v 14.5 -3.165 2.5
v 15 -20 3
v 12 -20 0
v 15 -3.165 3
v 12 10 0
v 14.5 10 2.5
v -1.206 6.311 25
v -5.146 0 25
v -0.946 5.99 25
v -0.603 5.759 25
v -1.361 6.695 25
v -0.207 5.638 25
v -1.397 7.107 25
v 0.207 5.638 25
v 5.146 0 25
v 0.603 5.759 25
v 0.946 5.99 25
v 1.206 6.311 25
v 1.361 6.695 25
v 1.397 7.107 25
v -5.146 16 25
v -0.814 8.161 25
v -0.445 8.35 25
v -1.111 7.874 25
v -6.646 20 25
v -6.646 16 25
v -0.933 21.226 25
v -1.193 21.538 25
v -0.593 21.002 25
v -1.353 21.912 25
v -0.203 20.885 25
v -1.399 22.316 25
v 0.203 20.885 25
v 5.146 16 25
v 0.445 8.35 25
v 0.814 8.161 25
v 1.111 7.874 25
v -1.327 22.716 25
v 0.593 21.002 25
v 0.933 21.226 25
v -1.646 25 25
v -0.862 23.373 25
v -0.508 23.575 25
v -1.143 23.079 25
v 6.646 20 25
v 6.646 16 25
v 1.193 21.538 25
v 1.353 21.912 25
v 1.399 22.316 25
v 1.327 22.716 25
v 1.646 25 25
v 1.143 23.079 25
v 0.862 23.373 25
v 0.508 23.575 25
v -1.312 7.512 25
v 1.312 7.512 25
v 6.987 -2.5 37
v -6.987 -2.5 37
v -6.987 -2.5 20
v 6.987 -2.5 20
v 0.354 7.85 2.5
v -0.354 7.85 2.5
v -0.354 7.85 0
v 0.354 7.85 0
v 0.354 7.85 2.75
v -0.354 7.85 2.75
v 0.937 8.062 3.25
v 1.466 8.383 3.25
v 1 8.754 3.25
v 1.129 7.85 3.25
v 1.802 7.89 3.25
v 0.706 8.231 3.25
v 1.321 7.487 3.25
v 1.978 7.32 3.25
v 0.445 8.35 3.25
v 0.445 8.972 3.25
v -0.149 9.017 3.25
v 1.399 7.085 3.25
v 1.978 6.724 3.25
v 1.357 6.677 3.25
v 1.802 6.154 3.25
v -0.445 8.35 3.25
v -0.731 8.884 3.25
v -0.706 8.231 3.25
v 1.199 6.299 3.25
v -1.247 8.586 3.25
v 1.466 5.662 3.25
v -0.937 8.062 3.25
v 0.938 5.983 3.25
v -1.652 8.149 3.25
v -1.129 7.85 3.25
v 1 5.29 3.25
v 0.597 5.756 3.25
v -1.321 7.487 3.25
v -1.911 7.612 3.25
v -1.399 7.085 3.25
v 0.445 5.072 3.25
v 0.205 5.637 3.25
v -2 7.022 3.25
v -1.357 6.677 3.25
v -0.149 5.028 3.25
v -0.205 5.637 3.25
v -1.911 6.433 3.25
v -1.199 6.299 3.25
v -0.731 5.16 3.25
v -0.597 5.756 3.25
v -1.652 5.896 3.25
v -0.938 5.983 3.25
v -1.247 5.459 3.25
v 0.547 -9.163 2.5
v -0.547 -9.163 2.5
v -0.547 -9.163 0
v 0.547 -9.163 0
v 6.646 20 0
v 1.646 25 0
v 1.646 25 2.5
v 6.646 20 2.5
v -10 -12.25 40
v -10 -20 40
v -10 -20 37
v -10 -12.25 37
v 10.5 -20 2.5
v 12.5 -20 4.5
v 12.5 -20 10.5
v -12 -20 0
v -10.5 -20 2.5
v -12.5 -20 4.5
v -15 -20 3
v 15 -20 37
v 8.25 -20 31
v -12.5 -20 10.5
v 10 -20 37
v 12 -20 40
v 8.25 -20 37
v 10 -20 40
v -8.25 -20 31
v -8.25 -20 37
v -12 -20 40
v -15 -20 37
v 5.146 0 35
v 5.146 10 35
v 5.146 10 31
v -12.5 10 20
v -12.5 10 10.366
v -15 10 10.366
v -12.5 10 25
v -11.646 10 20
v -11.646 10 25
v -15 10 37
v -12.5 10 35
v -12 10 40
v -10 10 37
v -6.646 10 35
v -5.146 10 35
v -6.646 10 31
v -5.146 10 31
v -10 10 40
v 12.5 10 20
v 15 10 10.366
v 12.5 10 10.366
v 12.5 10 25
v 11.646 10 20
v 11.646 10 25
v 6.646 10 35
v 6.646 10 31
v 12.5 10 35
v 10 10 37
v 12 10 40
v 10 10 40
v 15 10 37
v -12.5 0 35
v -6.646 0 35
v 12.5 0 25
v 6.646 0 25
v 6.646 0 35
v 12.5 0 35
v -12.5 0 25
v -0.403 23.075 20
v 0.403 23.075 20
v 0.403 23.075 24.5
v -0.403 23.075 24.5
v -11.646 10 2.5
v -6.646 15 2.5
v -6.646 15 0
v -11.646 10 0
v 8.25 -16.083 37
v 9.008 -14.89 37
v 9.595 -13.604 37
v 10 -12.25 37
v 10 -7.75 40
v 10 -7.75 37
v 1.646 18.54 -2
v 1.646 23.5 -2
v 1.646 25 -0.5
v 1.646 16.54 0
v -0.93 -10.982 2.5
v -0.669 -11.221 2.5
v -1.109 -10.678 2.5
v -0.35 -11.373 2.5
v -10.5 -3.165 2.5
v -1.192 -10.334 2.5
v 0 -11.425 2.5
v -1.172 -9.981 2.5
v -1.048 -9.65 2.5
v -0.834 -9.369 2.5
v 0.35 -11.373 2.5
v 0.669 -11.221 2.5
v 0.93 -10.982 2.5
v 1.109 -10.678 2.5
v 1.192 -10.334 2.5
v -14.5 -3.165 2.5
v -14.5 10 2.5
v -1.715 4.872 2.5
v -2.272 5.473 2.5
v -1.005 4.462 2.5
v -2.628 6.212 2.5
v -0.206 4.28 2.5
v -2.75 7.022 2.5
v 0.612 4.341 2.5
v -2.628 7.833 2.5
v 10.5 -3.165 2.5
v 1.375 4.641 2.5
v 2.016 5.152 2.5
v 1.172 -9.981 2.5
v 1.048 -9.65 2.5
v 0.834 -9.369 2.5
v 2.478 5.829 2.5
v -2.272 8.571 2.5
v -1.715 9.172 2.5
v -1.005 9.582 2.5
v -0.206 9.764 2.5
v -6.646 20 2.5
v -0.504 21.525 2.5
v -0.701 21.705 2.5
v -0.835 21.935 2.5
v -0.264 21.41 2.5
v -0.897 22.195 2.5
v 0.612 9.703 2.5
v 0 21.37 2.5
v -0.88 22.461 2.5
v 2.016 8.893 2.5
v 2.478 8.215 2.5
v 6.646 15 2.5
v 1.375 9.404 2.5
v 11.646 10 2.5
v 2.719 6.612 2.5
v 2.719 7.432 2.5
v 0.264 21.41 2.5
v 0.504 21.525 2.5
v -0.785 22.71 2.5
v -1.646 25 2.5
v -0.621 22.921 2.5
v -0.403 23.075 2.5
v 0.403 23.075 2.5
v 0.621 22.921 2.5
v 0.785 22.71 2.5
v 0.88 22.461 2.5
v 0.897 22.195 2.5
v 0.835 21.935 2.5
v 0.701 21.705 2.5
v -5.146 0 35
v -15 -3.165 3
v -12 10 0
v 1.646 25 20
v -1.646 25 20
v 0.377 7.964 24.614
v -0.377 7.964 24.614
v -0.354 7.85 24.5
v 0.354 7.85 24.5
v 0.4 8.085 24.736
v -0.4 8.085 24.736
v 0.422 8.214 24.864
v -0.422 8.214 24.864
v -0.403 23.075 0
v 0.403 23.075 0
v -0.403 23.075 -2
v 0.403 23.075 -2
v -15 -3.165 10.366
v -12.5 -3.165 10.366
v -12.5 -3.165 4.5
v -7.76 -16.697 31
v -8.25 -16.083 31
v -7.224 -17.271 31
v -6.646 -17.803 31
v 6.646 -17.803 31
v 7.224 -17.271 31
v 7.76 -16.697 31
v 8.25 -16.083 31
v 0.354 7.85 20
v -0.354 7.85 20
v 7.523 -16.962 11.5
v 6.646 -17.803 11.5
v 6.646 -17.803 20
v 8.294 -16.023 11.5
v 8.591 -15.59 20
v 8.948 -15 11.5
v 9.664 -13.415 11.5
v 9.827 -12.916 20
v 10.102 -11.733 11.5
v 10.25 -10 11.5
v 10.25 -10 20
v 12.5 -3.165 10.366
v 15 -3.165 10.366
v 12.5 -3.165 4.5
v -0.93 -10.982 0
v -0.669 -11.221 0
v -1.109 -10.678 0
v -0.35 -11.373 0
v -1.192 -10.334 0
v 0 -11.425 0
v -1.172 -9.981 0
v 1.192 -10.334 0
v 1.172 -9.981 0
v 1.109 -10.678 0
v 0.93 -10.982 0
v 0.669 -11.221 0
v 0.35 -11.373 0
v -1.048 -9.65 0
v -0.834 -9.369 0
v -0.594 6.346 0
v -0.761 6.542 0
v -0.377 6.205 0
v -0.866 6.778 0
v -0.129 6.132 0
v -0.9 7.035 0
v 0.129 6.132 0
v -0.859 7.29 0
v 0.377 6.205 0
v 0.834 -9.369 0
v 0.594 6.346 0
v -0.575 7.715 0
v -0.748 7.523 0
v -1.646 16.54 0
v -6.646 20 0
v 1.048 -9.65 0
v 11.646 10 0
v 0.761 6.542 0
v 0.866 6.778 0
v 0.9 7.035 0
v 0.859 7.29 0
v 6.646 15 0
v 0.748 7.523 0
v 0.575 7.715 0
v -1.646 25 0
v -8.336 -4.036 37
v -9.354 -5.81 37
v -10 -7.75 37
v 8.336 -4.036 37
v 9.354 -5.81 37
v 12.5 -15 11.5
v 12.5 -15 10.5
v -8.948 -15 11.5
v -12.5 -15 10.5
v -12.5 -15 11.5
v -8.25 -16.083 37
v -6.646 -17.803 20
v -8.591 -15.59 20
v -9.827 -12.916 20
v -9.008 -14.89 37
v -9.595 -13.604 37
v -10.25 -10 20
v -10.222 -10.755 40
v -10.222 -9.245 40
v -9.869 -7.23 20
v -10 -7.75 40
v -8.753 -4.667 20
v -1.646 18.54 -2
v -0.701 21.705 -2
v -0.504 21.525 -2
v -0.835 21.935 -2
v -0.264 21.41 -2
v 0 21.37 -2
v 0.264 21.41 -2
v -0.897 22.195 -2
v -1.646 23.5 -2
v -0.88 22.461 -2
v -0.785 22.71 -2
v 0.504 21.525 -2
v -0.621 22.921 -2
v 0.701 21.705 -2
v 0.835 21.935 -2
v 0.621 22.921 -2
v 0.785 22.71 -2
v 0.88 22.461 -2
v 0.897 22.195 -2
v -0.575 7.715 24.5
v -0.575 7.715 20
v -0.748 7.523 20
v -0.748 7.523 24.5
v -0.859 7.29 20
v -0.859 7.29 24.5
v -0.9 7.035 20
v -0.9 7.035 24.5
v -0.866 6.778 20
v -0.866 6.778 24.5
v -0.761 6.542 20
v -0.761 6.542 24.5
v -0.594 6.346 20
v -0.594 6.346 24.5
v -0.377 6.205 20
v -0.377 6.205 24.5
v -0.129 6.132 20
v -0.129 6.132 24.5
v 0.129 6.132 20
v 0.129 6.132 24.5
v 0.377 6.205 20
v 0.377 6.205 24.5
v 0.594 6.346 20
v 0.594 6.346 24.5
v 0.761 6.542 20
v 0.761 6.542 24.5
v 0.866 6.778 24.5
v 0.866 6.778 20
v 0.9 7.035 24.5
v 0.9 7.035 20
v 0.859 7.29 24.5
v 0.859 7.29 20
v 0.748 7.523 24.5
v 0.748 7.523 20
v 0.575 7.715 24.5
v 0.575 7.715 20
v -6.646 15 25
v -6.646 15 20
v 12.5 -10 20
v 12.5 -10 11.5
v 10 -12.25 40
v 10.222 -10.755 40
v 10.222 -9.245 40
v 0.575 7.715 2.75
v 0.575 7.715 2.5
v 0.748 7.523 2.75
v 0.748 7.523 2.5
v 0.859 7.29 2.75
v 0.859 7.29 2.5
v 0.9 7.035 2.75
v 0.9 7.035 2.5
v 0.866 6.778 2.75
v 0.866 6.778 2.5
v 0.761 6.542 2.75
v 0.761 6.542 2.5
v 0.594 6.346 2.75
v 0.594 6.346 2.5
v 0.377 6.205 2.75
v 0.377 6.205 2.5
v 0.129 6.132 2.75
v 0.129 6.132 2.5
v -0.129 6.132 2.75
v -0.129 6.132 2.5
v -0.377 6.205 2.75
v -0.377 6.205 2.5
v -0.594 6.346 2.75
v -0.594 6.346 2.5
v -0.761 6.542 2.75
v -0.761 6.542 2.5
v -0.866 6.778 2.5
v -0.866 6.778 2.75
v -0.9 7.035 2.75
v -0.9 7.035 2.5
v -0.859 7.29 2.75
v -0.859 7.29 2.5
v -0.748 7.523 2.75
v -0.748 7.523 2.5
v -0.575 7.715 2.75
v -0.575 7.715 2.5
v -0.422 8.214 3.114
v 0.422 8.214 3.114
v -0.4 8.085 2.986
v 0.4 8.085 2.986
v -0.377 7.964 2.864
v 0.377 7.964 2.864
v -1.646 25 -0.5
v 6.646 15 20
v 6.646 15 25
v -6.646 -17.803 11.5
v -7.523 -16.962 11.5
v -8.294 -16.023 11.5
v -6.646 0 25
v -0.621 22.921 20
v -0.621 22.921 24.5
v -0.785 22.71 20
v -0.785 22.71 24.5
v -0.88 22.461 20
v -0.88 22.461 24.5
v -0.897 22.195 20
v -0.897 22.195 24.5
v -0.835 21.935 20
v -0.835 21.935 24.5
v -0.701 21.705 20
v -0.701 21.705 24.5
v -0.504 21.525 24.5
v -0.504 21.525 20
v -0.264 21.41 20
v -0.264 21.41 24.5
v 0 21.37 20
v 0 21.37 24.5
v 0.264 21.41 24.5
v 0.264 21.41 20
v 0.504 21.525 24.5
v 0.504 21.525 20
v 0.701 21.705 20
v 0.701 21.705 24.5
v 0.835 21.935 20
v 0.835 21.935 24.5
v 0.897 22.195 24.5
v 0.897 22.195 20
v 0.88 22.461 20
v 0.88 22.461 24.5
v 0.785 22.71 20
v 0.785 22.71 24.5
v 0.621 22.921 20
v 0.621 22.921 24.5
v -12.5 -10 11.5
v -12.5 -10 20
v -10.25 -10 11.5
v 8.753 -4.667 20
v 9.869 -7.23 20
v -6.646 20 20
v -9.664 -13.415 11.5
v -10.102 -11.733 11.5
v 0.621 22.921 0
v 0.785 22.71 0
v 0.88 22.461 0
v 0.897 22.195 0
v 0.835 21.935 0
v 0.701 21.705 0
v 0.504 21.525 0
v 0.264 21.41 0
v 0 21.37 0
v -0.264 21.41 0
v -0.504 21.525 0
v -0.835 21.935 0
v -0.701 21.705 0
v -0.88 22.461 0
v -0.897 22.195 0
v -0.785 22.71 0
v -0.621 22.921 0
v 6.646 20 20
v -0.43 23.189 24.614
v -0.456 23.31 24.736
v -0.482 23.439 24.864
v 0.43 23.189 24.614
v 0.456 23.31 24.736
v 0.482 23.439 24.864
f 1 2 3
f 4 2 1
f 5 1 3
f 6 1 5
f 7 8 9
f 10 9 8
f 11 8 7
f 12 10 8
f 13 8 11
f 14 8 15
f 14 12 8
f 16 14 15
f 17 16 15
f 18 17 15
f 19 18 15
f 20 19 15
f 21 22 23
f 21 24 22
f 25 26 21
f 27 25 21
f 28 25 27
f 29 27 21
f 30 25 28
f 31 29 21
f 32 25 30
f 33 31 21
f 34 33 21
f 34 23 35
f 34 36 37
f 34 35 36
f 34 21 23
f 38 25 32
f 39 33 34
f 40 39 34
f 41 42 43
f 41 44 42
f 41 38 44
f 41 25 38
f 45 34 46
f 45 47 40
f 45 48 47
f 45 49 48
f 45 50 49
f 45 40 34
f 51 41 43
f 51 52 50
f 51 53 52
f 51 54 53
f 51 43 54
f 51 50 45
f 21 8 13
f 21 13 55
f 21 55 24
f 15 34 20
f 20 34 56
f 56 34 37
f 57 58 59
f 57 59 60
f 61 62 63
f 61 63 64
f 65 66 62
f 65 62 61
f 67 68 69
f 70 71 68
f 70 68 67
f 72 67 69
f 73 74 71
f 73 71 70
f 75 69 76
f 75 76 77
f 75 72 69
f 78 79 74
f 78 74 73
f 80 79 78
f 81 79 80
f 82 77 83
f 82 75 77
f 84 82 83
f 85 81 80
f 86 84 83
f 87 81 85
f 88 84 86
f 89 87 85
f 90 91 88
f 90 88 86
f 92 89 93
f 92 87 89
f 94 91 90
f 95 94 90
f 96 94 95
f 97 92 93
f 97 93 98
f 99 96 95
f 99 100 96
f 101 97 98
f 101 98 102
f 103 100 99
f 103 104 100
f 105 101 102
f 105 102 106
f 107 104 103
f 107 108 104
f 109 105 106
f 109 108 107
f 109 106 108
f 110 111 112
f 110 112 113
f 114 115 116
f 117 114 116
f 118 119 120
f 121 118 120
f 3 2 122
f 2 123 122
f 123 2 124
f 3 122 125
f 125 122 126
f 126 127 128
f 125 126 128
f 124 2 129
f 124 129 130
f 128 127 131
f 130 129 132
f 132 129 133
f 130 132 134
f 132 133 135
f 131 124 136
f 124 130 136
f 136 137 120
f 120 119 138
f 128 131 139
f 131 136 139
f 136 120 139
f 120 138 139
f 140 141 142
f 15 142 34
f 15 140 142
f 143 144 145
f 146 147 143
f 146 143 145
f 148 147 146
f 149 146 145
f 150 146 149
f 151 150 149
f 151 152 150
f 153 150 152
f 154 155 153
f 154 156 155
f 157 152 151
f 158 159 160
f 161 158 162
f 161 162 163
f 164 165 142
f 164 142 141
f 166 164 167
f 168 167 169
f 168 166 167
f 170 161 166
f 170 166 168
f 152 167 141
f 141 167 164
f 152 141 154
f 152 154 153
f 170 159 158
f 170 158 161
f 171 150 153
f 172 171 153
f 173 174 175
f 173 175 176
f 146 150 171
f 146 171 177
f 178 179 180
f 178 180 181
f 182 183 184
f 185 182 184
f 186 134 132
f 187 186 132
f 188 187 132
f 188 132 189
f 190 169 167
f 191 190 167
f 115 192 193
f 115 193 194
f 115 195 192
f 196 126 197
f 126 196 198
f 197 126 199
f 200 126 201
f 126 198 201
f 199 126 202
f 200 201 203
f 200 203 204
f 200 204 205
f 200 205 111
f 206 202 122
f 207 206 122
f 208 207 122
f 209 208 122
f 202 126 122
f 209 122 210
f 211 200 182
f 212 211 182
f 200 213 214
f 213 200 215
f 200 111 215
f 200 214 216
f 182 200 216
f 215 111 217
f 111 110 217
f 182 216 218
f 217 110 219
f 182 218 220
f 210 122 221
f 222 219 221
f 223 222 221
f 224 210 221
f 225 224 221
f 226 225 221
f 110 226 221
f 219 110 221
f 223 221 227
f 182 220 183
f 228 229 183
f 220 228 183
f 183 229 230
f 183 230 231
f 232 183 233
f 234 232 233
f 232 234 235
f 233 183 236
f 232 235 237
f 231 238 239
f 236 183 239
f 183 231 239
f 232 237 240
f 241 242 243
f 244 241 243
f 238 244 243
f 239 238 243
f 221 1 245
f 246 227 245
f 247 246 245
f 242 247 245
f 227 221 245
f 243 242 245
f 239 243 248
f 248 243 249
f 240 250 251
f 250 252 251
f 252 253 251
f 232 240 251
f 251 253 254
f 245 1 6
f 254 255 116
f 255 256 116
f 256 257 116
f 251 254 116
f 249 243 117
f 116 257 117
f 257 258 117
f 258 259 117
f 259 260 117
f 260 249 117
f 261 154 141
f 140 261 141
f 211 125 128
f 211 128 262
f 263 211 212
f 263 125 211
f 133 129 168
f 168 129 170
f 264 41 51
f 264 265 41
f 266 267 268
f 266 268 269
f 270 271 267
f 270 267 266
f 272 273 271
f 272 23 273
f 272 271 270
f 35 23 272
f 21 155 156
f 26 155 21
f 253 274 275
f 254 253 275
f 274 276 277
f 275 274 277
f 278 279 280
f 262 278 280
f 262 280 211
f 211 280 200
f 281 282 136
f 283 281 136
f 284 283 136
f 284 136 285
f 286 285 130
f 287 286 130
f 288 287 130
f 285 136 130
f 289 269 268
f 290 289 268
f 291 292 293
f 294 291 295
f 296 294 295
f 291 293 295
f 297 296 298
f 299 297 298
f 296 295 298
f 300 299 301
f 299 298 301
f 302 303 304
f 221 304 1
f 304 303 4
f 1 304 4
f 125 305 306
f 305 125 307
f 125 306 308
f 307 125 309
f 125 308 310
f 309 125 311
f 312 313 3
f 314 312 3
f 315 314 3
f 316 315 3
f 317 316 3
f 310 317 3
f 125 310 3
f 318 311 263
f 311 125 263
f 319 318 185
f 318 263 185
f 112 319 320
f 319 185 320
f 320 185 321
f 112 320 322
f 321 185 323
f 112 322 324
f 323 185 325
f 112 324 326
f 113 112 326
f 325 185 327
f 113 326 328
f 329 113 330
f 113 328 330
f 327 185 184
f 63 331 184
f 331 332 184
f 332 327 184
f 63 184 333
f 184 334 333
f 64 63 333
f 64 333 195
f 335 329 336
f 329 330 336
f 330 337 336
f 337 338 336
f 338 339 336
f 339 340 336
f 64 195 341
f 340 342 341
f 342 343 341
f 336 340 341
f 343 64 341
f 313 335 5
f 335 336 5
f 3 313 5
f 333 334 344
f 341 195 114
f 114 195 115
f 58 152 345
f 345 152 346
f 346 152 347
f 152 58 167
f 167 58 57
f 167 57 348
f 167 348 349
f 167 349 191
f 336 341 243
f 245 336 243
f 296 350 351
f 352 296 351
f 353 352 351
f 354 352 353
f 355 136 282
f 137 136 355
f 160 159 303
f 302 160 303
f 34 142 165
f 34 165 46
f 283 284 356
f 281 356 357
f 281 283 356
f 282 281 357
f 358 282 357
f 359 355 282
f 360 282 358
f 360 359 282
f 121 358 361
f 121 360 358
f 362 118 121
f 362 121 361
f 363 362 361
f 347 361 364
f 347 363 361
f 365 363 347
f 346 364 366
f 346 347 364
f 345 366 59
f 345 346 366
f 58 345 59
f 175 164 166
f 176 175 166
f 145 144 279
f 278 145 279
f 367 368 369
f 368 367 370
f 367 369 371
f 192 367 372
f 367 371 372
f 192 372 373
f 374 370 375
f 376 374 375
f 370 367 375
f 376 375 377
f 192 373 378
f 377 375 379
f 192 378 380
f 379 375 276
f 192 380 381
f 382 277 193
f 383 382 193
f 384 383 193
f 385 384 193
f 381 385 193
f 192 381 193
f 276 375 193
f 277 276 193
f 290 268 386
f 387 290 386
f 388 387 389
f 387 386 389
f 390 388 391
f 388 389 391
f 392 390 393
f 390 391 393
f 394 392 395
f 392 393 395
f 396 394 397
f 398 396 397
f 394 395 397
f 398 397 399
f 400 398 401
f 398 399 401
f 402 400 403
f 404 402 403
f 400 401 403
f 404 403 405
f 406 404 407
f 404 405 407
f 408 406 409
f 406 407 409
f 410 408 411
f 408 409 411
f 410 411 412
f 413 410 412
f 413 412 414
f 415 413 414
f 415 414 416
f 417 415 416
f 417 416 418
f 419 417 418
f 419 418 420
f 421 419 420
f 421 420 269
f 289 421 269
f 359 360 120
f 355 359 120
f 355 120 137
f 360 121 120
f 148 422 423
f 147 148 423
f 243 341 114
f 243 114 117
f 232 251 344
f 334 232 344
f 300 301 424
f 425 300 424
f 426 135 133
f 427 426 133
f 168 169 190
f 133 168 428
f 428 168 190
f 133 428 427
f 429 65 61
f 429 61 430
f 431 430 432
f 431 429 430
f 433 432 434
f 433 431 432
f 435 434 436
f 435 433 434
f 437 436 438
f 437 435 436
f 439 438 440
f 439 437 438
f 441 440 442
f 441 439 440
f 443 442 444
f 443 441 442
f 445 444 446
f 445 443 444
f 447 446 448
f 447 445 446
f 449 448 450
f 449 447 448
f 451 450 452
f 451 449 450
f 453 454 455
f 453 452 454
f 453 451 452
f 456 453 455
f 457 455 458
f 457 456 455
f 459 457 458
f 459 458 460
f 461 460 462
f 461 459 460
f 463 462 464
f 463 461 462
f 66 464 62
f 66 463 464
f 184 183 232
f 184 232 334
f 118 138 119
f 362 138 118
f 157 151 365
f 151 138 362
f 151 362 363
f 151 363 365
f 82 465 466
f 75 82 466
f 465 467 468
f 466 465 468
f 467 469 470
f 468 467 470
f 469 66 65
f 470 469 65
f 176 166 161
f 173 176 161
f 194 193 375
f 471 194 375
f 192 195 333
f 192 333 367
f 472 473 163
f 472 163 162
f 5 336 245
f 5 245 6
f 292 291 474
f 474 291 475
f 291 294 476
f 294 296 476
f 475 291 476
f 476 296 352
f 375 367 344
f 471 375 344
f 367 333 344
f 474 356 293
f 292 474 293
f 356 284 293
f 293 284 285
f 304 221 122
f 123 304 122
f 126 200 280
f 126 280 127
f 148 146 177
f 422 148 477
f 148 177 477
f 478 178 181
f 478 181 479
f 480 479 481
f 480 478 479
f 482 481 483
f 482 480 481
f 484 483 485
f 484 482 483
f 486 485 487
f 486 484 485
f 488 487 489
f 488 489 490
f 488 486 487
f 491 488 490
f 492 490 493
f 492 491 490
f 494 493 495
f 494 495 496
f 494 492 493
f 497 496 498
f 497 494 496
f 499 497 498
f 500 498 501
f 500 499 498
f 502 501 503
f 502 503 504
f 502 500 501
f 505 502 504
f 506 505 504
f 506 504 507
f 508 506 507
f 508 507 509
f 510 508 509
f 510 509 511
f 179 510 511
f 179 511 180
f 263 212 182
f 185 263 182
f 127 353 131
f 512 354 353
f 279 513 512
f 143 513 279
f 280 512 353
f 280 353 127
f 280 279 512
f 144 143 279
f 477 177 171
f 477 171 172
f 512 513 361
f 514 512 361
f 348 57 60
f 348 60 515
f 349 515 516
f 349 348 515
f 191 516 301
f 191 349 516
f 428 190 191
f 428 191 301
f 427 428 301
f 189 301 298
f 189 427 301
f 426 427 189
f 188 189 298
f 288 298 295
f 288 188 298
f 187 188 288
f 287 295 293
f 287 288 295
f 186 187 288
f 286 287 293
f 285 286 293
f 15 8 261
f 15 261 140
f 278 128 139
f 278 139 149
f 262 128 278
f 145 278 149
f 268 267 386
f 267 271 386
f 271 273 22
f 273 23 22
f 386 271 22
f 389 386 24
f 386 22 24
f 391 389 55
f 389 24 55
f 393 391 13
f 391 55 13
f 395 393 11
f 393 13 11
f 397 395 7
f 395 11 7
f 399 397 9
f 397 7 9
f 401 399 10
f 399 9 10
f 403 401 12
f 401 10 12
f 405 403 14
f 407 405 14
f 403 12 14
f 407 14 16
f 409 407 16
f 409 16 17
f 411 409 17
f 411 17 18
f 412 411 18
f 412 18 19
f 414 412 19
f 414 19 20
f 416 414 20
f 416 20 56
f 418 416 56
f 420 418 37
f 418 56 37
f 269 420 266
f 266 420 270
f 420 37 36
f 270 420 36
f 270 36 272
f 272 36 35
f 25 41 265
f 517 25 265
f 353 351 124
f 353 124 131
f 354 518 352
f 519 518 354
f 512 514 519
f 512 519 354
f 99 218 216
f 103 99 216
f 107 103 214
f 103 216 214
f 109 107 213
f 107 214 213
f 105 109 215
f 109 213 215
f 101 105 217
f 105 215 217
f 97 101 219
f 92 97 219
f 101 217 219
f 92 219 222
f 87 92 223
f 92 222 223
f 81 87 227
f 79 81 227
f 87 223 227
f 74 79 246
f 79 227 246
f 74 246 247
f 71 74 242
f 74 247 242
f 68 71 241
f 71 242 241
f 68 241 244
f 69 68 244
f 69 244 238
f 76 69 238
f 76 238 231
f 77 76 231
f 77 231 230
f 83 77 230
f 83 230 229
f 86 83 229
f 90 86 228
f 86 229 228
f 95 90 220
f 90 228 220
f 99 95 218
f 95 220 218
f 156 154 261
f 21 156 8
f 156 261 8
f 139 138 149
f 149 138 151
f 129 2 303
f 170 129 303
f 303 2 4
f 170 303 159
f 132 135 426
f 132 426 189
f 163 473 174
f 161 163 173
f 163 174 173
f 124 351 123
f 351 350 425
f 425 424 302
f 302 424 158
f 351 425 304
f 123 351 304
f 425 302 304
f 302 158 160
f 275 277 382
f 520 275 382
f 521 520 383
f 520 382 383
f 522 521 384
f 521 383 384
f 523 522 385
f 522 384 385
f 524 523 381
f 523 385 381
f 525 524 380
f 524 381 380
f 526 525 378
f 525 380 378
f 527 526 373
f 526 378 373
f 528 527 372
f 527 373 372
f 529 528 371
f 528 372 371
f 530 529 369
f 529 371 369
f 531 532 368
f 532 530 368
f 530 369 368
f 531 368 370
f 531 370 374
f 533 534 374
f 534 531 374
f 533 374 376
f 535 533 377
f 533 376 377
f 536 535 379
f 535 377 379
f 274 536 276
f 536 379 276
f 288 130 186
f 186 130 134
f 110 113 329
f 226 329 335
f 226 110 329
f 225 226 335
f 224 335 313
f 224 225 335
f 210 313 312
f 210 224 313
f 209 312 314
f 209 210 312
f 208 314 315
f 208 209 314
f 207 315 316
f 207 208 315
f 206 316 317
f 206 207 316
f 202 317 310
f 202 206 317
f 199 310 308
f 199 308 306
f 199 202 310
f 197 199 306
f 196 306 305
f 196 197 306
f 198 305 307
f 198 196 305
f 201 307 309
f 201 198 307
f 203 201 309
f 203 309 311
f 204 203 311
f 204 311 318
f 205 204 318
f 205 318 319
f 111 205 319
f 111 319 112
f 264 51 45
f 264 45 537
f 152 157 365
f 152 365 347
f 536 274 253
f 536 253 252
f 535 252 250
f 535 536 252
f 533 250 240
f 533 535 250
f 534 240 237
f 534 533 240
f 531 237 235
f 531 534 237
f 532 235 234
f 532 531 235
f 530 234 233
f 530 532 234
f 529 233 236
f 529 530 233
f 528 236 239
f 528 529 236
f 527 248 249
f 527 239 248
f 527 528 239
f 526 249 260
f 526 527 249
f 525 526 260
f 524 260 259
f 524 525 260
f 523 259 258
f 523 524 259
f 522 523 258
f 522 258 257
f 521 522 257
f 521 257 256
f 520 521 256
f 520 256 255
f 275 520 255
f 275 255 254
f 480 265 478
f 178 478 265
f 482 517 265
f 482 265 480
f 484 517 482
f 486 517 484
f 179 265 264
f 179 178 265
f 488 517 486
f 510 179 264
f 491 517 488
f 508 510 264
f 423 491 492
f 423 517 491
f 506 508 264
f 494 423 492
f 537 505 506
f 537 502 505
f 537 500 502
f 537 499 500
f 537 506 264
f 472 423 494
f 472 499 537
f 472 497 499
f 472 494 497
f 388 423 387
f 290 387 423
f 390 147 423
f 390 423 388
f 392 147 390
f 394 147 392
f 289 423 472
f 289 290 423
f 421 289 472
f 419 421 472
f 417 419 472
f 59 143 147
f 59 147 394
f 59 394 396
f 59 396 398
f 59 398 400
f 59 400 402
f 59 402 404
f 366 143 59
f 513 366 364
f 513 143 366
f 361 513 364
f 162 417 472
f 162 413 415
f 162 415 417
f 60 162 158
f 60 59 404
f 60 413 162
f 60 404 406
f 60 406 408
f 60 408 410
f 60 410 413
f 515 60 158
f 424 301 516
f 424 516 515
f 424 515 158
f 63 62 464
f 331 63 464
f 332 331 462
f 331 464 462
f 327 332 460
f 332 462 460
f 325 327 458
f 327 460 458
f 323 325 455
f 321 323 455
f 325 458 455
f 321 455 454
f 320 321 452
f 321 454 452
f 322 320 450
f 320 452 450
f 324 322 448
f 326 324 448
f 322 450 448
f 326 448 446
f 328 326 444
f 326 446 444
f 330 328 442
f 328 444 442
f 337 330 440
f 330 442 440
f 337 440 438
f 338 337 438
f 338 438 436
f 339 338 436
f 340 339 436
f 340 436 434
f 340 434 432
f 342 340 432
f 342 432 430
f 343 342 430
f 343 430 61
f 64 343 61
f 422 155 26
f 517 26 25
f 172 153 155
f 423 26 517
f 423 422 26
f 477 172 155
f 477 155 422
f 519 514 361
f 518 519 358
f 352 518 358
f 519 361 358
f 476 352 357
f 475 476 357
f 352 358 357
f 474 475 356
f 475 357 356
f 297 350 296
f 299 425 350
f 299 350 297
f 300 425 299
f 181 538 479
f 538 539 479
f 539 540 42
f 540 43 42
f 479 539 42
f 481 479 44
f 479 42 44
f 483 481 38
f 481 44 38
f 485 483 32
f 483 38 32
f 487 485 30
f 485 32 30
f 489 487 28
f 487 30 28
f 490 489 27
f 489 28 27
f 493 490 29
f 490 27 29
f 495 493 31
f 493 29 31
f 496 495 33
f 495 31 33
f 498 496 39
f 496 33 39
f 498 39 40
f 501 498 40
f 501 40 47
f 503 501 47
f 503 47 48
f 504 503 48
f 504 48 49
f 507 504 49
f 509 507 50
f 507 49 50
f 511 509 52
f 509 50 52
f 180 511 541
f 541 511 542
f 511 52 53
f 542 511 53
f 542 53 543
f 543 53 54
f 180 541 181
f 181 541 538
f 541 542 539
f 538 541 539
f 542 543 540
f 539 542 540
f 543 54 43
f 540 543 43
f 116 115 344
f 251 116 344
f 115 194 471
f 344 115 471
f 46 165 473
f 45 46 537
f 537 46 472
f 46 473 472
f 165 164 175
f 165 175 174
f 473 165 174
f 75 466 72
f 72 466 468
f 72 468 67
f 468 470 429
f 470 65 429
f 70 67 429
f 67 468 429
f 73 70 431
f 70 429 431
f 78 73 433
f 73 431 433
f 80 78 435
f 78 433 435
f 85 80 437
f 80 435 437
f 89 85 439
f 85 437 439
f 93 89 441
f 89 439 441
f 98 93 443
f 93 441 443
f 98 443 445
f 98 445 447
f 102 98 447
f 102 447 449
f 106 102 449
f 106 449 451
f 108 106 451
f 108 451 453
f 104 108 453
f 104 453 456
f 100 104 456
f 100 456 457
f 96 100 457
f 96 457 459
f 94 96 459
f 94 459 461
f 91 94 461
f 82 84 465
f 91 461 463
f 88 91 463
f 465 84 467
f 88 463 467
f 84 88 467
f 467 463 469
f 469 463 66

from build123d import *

# Parameters (mm, degrees)
SKETCH1_W            = 30
SKETCH1_H            = 40
BOSS_EXTRUDE1_DEPTH  = 40
CUT_EXTRUDE1_DEPTH   = 35
SKETCH4_W            = 25
SKETCH4_H            = 35
CUT_EXTRUDE3_DEPTH   = 20
SKETCH5_W            = 25
SKETCH5_H            = 17.5
CUT_EXTRUDE4_DEPTH   = 20
SKETCH13_W           = 25
SKETCH13_H           = 5
BOSS_EXTRUDE3_DEPTH  = 20
CUT_EXTRUDE5_DEPTH   = 40
CUT_EXTRUDE6_START   = -40
CUT_EXTRUDE6_DEPTH   = 40
CUT_EXTRUDE9_START   = -40
SKETCH10_W           = 30
SKETCH10_H           = 10
CUT_EXTRUDE9_DEPTH   = 40
CHAMFER2_SIZE        = 3
CUT_EXTRUDE10_DEPTH  = 28.5
SKETCH17_W           = 25
SKETCH17_H           = 2.5
BOSS_EXTRUDE4_DEPTH  = 10
CUT_EXTRUDE13_START  = -30
SKETCH18_W           = 20
SKETCH18_H           = 3
CUT_EXTRUDE13_DEPTH  = 30
SKETCH19_W           = 16.5
SKETCH19_H           = 6
CUT_EXTRUDE14_DEPTH  = 10
BOSS_EXTRUDE5_DEPTH  = 8.5
SKETCH22_W           = 25
SKETCH22_H           = 5
BOSS_EXTRUDE6_DEPTH  = 1
SKETCH23_W           = 13.292868742
SKETCH23_H           = 5
BOSS_EXTRUDE7_DEPTH  = 15
CHAMFER4_SIZE        = 5
CHAMFER6_SIZE        = 5
SKETCH30_W           = 1.5
SKETCH30_H           = 10
BOSS_EXTRUDE8_DEPTH  = 20
CHAMFER10_SIZE       = 14
CUT_EXTRUDE15_DEPTH  = 25
CHAMFER11_SIZE       = 2
BOSS_EXTRUDE9_START  = 0.75
SKETCH31_R           = 2
BOSS_EXTRUDE9_DEPTH  = 0.75
CHAMFER12_SIZE       = 0.5
CHAMFER13_SIZE       = 0.5
CHAMFER14_SIZE       = 0.75
CHAMFER15_SIZE       = 0.5
BOSS_EXTRUDE10_START = 2
SKETCH32_W           = 3.292868742
SKETCH32_H           = 5.46
BOSS_EXTRUDE10_DEPTH = 2
CHAMFER16_SIZE       = 3
CHAMFER17_SIZE       = 1.5


# Some blends are built 0.0001 mm under size
with BuildPart() as part:
    # Sketch1 → Boss-Extrude1 (new body)
    with BuildSketch(Plane.XY):
        Rectangle(SKETCH1_W, SKETCH1_H)
    extrude(amount=BOSS_EXTRUDE1_DEPTH)

    # Sketch2 → Cut-Extrude1 (cut)
    with BuildSketch(Plane.XY.offset(40)):
        with BuildLine():
            Line((-6.986594306, -2.5), (6.986594306, -2.5))
            ThreePointArc((6.986594306, -2.5), (10.247468698, -10.227783409), (6.646434371, -17.80303852))
            Line((6.646434371, -17.80303852), (-6.646434371, -17.80303852))
            ThreePointArc((-6.646434371, -17.80303852), (-10.247468698, -10.227783409), (-6.986594306, -2.5))
        make_face()
    extrude(amount=-CUT_EXTRUDE1_DEPTH, mode=Mode.SUBTRACT)

    # Sketch4 → Cut-Extrude3 (cut)
    with BuildSketch(Plane(origin=(0, 20, 0), x_dir=(1, 0, 0), z_dir=(0, 1, 0))):
        with Locations((0, -20)):
            Rectangle(SKETCH4_W, SKETCH4_H)
    extrude(amount=-CUT_EXTRUDE3_DEPTH, mode=Mode.SUBTRACT)

    # Sketch5 → Cut-Extrude4 (cut)
    with BuildSketch(Plane(origin=(0, 0, 0), x_dir=(1, 0, 0), z_dir=(0, 1, 0))):
        with Locations((0, -11.25)):
            Rectangle(SKETCH5_W, SKETCH5_H)
    extrude(amount=-CUT_EXTRUDE4_DEPTH, mode=Mode.SUBTRACT)

    # Sketch13 → Boss-Extrude3 (add)
    with BuildSketch(Plane(origin=(0, 0, 0), x_dir=(1, 0, 0), z_dir=(0, 1, 0))):
        with Locations((0, -22.5)):
            Rectangle(SKETCH13_W, SKETCH13_H)
    extrude(amount=BOSS_EXTRUDE3_DEPTH)

    # Sketch8 → Cut-Extrude5 (cut)
    with BuildSketch(Plane.XY.offset(40)):
        with BuildLine():
            Line((-0.546667462, -9.162650201), (0.546667462, -9.162650201))
            ThreePointArc((0.546667462, -9.162650201), (0, -11.425011068), (-0.546667462, -9.162650201))
        make_face()
    extrude(amount=-CUT_EXTRUDE5_DEPTH, mode=Mode.SUBTRACT)

    # Sketch9 → Cut-Extrude6 (cut)
    with BuildSketch(Plane(origin=(0, 0, 0), x_dir=(-1, 0, 0), z_dir=(0, 0, -1)).offset(CUT_EXTRUDE6_START)):
        with BuildLine():
            Line((-0.354264308, 7.849559809), (0.354264308, 7.849559809))
            ThreePointArc((0.354264308, 7.849559809), (0, 6.122216591), (-0.354264308, 7.849559809))
        make_face()
    extrude(amount=CUT_EXTRUDE6_DEPTH, mode=Mode.SUBTRACT)

    # Sketch10 → Cut-Extrude9 (cut)
    with BuildSketch(Plane.XY.offset(40).offset(CUT_EXTRUDE9_START)):
        with Locations((0, 15)):
            Rectangle(SKETCH10_W, SKETCH10_H)
    extrude(amount=CUT_EXTRUDE9_DEPTH, mode=Mode.SUBTRACT)

    # Chamfer2
    chamfer2_edges = [part.edges().sort_by_distance(p)[0] for p in [
        (-15, -5, 0),
        (-15, -5, 40),
        (15, -5, 40),
        (15, -5, 0),
    ]]
    chamfer(chamfer2_edges, length=CHAMFER2_SIZE)

    # Sketch16 → Cut-Extrude10 (cut, symmetric)
    with BuildSketch(Plane(origin=(-12.5, 0, 0), x_dir=(0, 0, -1), z_dir=(1, 0, 0))):
        Polygon((-2.5, 10), (-9.536752506, 10), (-10.366434052, 10), (-10.366434052, -3.164876481), (-9.536752506, -3.164876481), (-2.5, -3.164876481), align=None)
    extrude(amount=CUT_EXTRUDE10_DEPTH, both=True, mode=Mode.SUBTRACT)

    # Sketch17 → Boss-Extrude4 (add)
    with BuildSketch(Plane(origin=(0, 10, 0), x_dir=(1, 0, 0), z_dir=(0, 1, 0))):
        with Locations((0, -36.25)):
            Rectangle(SKETCH17_W, SKETCH17_H)
    extrude(amount=-BOSS_EXTRUDE4_DEPTH)

    # Sketch18 → Cut-Extrude13 (cut)
    with BuildSketch(Plane(origin=(0, 10, 0), x_dir=(1, 0, 0), z_dir=(0, 1, 0)).offset(CUT_EXTRUDE13_START)):
        with Locations((0, -38.5)):
            Rectangle(SKETCH18_W, SKETCH18_H)
    extrude(amount=CUT_EXTRUDE13_DEPTH, mode=Mode.SUBTRACT)

    # Sketch19 → Cut-Extrude14 (cut)
    with BuildSketch(Plane.XZ.offset(20)):
        with Locations((0, 34)):
            Rectangle(SKETCH19_W, SKETCH19_H)
    extrude(amount=-CUT_EXTRUDE14_DEPTH, mode=Mode.SUBTRACT)

    # Sketch20 → Boss-Extrude5 (add)
    with BuildSketch(Plane(origin=(0, 0, 20), x_dir=(-1, 0, 0), z_dir=(0, 0, -1))):
        with BuildLine():
            Line((12.5, -10), (10.25, -10))
            ThreePointArc((10.25, -10), (9.305601869, -14.297472961), (6.646434371, -17.80303852))
            Line((6.646434371, -17.80303852), (-6.646434371, -17.80303852))
            ThreePointArc((-6.646434371, -17.80303852), (-9.305601869, -14.297472961), (-10.25, -10))
            Line((-10.25, -10), (-12.5, -10))
            Line((-12.5, -10), (-12.5, -20))
            Line((-12.5, -20), (12.5, -20))
            Line((12.5, -20), (12.5, -10))
        make_face()
    extrude(amount=BOSS_EXTRUDE5_DEPTH)

    # Sketch22 → Boss-Extrude6 (add)
    with BuildSketch(Plane(origin=(0, 0, 11.5), x_dir=(-1, 0, 0), z_dir=(0, 0, -1))):
        with Locations((0, -17.5)):
            Rectangle(SKETCH22_W, SKETCH22_H)
    extrude(amount=BOSS_EXTRUDE6_DEPTH)

    # Sketch23 → Boss-Extrude7 (add)
    with BuildSketch(Plane(origin=(0, 10, 0), x_dir=(1, 0, 0), z_dir=(0, 1, 0))):
        with Locations((0, -22.5)):
            Rectangle(SKETCH23_W, SKETCH23_H)
        Polygon((6.646434371, 0), (6.646434371, -2.5), (0, -2.5), (-6.646434371, -2.5), (-6.646434371, 0), align=None)
    extrude(amount=BOSS_EXTRUDE7_DEPTH)

    # Chamfer4
    chamfer4_edges = [part.edges().sort_by_distance(p)[0] for p in [
        (6.646434371, 10, 22.5),
        (-6.646434371, 10, 22.5),
        (6.646434371, 10, 1.25),
        (-6.646434371, 10, 1.25),
    ]]
    chamfer(chamfer4_edges, length=CHAMFER4_SIZE)

    # Chamfer6
    chamfer6_edges = [part.edges().sort_by_distance(p)[0] for p in [
        (6.646434371, 25, 22.5),
        (-6.646434371, 25, 22.5),
        (6.646434371, 25, 1.25),
        (-6.646434371, 25, 1.25),
    ]]
    chamfer(chamfer6_edges, length=CHAMFER6_SIZE)

    # Sketch30 → Boss-Extrude8 (add)
    with BuildSketch(Plane(origin=(0, 0, 0), x_dir=(1, 0, 0), z_dir=(0, 1, 0))):
        with Locations((-5.896434371, -30)):
            Rectangle(SKETCH30_W, SKETCH30_H)
        with Locations((5.896434371, -30)):
            Rectangle(SKETCH30_W, SKETCH30_H)
    extrude(amount=BOSS_EXTRUDE8_DEPTH)

    # Chamfer10
    # the kernel refuses this chamfer: 14 mm, written as the material it takes off along each edge
    with BuildSketch(Plane(origin=(-30.85712746, 20, 35), x_dir=(0, -0.9996219169112968, 0.02749587661058661), z_dir=(1, 0, 0))) as chamfer10_piece_1_section:
        Polygon((CHAMFER10_SIZE * 0.999621916911, CHAMFER10_SIZE * 0.0274958766106), (-CHAMFER10_SIZE * 0.0274958766106, CHAMFER10_SIZE * 0.999621916911), (0, 0), align=None)
    chamfer10_piece_1 = extrude(amount=73.507123663, mode=Mode.PRIVATE)
    chamfer10_piece_1 = split(chamfer10_piece_1, bisect_by=Plane(origin=(5.896434371, 10, 30.768271906), z_dir=(0, 1, 0)), keep=Keep.TOP, mode=Mode.PRIVATE)
    chamfer10_piece_1 = split(chamfer10_piece_1, bisect_by=Plane(origin=(5.896434371, 15.768271906, 25), z_dir=(0, 0, 1)), keep=Keep.TOP, mode=Mode.PRIVATE)
    add(chamfer10_piece_1, mode=Mode.SUBTRACT)
    with BuildSketch(Plane(origin=(30.85712746, 20, 35), x_dir=(0, -0.9996219169112968, 0.02749587661058661), z_dir=(-1, 0, 0))) as chamfer10_piece_2_section:
        Polygon((CHAMFER10_SIZE * 0.999621916911, -CHAMFER10_SIZE * 0.0274958766106), (-CHAMFER10_SIZE * 0.0274958766106, -CHAMFER10_SIZE * 0.999621916911), (0, 0), align=None)
    chamfer10_piece_2 = extrude(amount=73.507123663, mode=Mode.PRIVATE)
    chamfer10_piece_2 = split(chamfer10_piece_2, bisect_by=Plane(origin=(-5.896434371, 10, 30.768271906), z_dir=(0, 1, 0)), keep=Keep.TOP, mode=Mode.PRIVATE)
    chamfer10_piece_2 = split(chamfer10_piece_2, bisect_by=Plane(origin=(-5.896434371, 15.768271906, 25), z_dir=(0, 0, 1)), keep=Keep.TOP, mode=Mode.PRIVATE)
    add(chamfer10_piece_2, mode=Mode.SUBTRACT)

    # Sketch29 → Cut-Extrude15 (cut)
    with BuildSketch(Plane(origin=(0, 0, 0), x_dir=(-1, 0, 0), z_dir=(0, 0, -1))):
        with BuildLine():
            Line((-0.403434811, 23.074512494), (0.403434811, 23.074512494))
            ThreePointArc((0.403434811, 23.074512494), (0, 21.37), (-0.403434811, 23.074512494))
        make_face()
    extrude(amount=-CUT_EXTRUDE15_DEPTH, mode=Mode.SUBTRACT)

    # Chamfer11
    chamfer11_edges = [part.edges().sort_by_distance(p)[0] for p in [
        (12.5, -11.58243824, 2.5),
        (-12.5, -11.58243824, 2.5),
    ]]
    chamfer(chamfer11_edges, length=CHAMFER11_SIZE)

    # Sketch31 → Boss-Extrude9 (add)
    with BuildSketch(Plane.XY.offset(2.5).offset(BOSS_EXTRUDE9_START)):
        with Locations(Location((0, 7.022216591, 0), (0, 0, 180))):
            Circle(SKETCH31_R)
        with BuildLine():
            Line((-0.354264308, 7.849559809), (0.354264308, 7.849559809))
            ThreePointArc((0.354264308, 7.849559809), (0, 6.122216591), (-0.354264308, 7.849559809))
        make_face(mode=Mode.SUBTRACT)
    extrude(amount=-BOSS_EXTRUDE9_DEPTH)

    # Chamfer12
    chamfer12_edges = [part.edges().sort_by_distance(p)[0] for p in [
        (0, 6.122216591, 3.25),
    ]]
    chamfer(chamfer12_edges, length=CHAMFER12_SIZE)

    # Chamfer13
    chamfer13_edges = [part.edges().sort_by_distance(p)[0] for p in [
        (0, 7.849559809, 3.25),
    ]]
    chamfer(chamfer13_edges, length=CHAMFER13_SIZE)

    # Chamfer14
    chamfer14_edges = [part.edges().sort_by_distance(p)[0] for p in [
        (2, 7.022216591, 2.5),
    ]]
    chamfer(chamfer14_edges, length=CHAMFER14_SIZE - 0.0001)  # a hair under: the kernel refuses the full size

    # Chamfer15
    chamfer15_edges = [part.edges().sort_by_distance(p)[0] for p in [
        (0, 21.37, 25),
        (0, 23.074512494, 25),
        (0, 7.849559809, 25),
        (0, 6.122216591, 25),
    ]]
    chamfer(chamfer15_edges, length=CHAMFER15_SIZE)

    # Sketch32 → Boss-Extrude10 (add)
    with BuildSketch(Plane(origin=(0, 0, 0), x_dir=(-1, 0, 0), z_dir=(0, 0, -1)).offset(BOSS_EXTRUDE10_START)):
        with Locations((0, 22.27)):
            Rectangle(SKETCH32_W, SKETCH32_H)
        with BuildLine():
            Line((0.403434811, 23.074512494), (-0.403434811, 23.074512494))
            ThreePointArc((-0.403434811, 23.074512494), (0, 21.37), (0.403434811, 23.074512494))
        make_face(mode=Mode.SUBTRACT)
    extrude(amount=-BOSS_EXTRUDE10_DEPTH)

    # Chamfer16
    # the kernel refuses this chamfer: 3 mm, written as the material it adds along each edge
    with BuildSketch(Plane(origin=(1.646434371, 19.54, 0), x_dir=(0, -0.9996219169112968, 0.02749587661058636), z_dir=(-1, 0, 0))) as chamfer16_piece_1_section:
        Polygon((CHAMFER16_SIZE * 0.999621916911, -CHAMFER16_SIZE * 0.0274958766106), (-CHAMFER16_SIZE * 0.0274958766106, -CHAMFER16_SIZE * 0.999621916911), (0, 0), align=None)
    chamfer16_piece_1 = extrude(amount=3.292868742, mode=Mode.PRIVATE)
    chamfer16_piece_1 = split(chamfer16_piece_1, bisect_by=Plane(origin=(0, 18.447908995, -2), z_dir=(0, 0, 1)), keep=Keep.TOP, mode=Mode.PRIVATE)
    add(chamfer16_piece_1)

    # Chamfer17
    chamfer17_edges = [part.edges().sort_by_distance(p)[0] for p in [
        (0, 25, -2),
    ]]
    chamfer(chamfer17_edges, length=CHAMFER17_SIZE)


solid = part.part
